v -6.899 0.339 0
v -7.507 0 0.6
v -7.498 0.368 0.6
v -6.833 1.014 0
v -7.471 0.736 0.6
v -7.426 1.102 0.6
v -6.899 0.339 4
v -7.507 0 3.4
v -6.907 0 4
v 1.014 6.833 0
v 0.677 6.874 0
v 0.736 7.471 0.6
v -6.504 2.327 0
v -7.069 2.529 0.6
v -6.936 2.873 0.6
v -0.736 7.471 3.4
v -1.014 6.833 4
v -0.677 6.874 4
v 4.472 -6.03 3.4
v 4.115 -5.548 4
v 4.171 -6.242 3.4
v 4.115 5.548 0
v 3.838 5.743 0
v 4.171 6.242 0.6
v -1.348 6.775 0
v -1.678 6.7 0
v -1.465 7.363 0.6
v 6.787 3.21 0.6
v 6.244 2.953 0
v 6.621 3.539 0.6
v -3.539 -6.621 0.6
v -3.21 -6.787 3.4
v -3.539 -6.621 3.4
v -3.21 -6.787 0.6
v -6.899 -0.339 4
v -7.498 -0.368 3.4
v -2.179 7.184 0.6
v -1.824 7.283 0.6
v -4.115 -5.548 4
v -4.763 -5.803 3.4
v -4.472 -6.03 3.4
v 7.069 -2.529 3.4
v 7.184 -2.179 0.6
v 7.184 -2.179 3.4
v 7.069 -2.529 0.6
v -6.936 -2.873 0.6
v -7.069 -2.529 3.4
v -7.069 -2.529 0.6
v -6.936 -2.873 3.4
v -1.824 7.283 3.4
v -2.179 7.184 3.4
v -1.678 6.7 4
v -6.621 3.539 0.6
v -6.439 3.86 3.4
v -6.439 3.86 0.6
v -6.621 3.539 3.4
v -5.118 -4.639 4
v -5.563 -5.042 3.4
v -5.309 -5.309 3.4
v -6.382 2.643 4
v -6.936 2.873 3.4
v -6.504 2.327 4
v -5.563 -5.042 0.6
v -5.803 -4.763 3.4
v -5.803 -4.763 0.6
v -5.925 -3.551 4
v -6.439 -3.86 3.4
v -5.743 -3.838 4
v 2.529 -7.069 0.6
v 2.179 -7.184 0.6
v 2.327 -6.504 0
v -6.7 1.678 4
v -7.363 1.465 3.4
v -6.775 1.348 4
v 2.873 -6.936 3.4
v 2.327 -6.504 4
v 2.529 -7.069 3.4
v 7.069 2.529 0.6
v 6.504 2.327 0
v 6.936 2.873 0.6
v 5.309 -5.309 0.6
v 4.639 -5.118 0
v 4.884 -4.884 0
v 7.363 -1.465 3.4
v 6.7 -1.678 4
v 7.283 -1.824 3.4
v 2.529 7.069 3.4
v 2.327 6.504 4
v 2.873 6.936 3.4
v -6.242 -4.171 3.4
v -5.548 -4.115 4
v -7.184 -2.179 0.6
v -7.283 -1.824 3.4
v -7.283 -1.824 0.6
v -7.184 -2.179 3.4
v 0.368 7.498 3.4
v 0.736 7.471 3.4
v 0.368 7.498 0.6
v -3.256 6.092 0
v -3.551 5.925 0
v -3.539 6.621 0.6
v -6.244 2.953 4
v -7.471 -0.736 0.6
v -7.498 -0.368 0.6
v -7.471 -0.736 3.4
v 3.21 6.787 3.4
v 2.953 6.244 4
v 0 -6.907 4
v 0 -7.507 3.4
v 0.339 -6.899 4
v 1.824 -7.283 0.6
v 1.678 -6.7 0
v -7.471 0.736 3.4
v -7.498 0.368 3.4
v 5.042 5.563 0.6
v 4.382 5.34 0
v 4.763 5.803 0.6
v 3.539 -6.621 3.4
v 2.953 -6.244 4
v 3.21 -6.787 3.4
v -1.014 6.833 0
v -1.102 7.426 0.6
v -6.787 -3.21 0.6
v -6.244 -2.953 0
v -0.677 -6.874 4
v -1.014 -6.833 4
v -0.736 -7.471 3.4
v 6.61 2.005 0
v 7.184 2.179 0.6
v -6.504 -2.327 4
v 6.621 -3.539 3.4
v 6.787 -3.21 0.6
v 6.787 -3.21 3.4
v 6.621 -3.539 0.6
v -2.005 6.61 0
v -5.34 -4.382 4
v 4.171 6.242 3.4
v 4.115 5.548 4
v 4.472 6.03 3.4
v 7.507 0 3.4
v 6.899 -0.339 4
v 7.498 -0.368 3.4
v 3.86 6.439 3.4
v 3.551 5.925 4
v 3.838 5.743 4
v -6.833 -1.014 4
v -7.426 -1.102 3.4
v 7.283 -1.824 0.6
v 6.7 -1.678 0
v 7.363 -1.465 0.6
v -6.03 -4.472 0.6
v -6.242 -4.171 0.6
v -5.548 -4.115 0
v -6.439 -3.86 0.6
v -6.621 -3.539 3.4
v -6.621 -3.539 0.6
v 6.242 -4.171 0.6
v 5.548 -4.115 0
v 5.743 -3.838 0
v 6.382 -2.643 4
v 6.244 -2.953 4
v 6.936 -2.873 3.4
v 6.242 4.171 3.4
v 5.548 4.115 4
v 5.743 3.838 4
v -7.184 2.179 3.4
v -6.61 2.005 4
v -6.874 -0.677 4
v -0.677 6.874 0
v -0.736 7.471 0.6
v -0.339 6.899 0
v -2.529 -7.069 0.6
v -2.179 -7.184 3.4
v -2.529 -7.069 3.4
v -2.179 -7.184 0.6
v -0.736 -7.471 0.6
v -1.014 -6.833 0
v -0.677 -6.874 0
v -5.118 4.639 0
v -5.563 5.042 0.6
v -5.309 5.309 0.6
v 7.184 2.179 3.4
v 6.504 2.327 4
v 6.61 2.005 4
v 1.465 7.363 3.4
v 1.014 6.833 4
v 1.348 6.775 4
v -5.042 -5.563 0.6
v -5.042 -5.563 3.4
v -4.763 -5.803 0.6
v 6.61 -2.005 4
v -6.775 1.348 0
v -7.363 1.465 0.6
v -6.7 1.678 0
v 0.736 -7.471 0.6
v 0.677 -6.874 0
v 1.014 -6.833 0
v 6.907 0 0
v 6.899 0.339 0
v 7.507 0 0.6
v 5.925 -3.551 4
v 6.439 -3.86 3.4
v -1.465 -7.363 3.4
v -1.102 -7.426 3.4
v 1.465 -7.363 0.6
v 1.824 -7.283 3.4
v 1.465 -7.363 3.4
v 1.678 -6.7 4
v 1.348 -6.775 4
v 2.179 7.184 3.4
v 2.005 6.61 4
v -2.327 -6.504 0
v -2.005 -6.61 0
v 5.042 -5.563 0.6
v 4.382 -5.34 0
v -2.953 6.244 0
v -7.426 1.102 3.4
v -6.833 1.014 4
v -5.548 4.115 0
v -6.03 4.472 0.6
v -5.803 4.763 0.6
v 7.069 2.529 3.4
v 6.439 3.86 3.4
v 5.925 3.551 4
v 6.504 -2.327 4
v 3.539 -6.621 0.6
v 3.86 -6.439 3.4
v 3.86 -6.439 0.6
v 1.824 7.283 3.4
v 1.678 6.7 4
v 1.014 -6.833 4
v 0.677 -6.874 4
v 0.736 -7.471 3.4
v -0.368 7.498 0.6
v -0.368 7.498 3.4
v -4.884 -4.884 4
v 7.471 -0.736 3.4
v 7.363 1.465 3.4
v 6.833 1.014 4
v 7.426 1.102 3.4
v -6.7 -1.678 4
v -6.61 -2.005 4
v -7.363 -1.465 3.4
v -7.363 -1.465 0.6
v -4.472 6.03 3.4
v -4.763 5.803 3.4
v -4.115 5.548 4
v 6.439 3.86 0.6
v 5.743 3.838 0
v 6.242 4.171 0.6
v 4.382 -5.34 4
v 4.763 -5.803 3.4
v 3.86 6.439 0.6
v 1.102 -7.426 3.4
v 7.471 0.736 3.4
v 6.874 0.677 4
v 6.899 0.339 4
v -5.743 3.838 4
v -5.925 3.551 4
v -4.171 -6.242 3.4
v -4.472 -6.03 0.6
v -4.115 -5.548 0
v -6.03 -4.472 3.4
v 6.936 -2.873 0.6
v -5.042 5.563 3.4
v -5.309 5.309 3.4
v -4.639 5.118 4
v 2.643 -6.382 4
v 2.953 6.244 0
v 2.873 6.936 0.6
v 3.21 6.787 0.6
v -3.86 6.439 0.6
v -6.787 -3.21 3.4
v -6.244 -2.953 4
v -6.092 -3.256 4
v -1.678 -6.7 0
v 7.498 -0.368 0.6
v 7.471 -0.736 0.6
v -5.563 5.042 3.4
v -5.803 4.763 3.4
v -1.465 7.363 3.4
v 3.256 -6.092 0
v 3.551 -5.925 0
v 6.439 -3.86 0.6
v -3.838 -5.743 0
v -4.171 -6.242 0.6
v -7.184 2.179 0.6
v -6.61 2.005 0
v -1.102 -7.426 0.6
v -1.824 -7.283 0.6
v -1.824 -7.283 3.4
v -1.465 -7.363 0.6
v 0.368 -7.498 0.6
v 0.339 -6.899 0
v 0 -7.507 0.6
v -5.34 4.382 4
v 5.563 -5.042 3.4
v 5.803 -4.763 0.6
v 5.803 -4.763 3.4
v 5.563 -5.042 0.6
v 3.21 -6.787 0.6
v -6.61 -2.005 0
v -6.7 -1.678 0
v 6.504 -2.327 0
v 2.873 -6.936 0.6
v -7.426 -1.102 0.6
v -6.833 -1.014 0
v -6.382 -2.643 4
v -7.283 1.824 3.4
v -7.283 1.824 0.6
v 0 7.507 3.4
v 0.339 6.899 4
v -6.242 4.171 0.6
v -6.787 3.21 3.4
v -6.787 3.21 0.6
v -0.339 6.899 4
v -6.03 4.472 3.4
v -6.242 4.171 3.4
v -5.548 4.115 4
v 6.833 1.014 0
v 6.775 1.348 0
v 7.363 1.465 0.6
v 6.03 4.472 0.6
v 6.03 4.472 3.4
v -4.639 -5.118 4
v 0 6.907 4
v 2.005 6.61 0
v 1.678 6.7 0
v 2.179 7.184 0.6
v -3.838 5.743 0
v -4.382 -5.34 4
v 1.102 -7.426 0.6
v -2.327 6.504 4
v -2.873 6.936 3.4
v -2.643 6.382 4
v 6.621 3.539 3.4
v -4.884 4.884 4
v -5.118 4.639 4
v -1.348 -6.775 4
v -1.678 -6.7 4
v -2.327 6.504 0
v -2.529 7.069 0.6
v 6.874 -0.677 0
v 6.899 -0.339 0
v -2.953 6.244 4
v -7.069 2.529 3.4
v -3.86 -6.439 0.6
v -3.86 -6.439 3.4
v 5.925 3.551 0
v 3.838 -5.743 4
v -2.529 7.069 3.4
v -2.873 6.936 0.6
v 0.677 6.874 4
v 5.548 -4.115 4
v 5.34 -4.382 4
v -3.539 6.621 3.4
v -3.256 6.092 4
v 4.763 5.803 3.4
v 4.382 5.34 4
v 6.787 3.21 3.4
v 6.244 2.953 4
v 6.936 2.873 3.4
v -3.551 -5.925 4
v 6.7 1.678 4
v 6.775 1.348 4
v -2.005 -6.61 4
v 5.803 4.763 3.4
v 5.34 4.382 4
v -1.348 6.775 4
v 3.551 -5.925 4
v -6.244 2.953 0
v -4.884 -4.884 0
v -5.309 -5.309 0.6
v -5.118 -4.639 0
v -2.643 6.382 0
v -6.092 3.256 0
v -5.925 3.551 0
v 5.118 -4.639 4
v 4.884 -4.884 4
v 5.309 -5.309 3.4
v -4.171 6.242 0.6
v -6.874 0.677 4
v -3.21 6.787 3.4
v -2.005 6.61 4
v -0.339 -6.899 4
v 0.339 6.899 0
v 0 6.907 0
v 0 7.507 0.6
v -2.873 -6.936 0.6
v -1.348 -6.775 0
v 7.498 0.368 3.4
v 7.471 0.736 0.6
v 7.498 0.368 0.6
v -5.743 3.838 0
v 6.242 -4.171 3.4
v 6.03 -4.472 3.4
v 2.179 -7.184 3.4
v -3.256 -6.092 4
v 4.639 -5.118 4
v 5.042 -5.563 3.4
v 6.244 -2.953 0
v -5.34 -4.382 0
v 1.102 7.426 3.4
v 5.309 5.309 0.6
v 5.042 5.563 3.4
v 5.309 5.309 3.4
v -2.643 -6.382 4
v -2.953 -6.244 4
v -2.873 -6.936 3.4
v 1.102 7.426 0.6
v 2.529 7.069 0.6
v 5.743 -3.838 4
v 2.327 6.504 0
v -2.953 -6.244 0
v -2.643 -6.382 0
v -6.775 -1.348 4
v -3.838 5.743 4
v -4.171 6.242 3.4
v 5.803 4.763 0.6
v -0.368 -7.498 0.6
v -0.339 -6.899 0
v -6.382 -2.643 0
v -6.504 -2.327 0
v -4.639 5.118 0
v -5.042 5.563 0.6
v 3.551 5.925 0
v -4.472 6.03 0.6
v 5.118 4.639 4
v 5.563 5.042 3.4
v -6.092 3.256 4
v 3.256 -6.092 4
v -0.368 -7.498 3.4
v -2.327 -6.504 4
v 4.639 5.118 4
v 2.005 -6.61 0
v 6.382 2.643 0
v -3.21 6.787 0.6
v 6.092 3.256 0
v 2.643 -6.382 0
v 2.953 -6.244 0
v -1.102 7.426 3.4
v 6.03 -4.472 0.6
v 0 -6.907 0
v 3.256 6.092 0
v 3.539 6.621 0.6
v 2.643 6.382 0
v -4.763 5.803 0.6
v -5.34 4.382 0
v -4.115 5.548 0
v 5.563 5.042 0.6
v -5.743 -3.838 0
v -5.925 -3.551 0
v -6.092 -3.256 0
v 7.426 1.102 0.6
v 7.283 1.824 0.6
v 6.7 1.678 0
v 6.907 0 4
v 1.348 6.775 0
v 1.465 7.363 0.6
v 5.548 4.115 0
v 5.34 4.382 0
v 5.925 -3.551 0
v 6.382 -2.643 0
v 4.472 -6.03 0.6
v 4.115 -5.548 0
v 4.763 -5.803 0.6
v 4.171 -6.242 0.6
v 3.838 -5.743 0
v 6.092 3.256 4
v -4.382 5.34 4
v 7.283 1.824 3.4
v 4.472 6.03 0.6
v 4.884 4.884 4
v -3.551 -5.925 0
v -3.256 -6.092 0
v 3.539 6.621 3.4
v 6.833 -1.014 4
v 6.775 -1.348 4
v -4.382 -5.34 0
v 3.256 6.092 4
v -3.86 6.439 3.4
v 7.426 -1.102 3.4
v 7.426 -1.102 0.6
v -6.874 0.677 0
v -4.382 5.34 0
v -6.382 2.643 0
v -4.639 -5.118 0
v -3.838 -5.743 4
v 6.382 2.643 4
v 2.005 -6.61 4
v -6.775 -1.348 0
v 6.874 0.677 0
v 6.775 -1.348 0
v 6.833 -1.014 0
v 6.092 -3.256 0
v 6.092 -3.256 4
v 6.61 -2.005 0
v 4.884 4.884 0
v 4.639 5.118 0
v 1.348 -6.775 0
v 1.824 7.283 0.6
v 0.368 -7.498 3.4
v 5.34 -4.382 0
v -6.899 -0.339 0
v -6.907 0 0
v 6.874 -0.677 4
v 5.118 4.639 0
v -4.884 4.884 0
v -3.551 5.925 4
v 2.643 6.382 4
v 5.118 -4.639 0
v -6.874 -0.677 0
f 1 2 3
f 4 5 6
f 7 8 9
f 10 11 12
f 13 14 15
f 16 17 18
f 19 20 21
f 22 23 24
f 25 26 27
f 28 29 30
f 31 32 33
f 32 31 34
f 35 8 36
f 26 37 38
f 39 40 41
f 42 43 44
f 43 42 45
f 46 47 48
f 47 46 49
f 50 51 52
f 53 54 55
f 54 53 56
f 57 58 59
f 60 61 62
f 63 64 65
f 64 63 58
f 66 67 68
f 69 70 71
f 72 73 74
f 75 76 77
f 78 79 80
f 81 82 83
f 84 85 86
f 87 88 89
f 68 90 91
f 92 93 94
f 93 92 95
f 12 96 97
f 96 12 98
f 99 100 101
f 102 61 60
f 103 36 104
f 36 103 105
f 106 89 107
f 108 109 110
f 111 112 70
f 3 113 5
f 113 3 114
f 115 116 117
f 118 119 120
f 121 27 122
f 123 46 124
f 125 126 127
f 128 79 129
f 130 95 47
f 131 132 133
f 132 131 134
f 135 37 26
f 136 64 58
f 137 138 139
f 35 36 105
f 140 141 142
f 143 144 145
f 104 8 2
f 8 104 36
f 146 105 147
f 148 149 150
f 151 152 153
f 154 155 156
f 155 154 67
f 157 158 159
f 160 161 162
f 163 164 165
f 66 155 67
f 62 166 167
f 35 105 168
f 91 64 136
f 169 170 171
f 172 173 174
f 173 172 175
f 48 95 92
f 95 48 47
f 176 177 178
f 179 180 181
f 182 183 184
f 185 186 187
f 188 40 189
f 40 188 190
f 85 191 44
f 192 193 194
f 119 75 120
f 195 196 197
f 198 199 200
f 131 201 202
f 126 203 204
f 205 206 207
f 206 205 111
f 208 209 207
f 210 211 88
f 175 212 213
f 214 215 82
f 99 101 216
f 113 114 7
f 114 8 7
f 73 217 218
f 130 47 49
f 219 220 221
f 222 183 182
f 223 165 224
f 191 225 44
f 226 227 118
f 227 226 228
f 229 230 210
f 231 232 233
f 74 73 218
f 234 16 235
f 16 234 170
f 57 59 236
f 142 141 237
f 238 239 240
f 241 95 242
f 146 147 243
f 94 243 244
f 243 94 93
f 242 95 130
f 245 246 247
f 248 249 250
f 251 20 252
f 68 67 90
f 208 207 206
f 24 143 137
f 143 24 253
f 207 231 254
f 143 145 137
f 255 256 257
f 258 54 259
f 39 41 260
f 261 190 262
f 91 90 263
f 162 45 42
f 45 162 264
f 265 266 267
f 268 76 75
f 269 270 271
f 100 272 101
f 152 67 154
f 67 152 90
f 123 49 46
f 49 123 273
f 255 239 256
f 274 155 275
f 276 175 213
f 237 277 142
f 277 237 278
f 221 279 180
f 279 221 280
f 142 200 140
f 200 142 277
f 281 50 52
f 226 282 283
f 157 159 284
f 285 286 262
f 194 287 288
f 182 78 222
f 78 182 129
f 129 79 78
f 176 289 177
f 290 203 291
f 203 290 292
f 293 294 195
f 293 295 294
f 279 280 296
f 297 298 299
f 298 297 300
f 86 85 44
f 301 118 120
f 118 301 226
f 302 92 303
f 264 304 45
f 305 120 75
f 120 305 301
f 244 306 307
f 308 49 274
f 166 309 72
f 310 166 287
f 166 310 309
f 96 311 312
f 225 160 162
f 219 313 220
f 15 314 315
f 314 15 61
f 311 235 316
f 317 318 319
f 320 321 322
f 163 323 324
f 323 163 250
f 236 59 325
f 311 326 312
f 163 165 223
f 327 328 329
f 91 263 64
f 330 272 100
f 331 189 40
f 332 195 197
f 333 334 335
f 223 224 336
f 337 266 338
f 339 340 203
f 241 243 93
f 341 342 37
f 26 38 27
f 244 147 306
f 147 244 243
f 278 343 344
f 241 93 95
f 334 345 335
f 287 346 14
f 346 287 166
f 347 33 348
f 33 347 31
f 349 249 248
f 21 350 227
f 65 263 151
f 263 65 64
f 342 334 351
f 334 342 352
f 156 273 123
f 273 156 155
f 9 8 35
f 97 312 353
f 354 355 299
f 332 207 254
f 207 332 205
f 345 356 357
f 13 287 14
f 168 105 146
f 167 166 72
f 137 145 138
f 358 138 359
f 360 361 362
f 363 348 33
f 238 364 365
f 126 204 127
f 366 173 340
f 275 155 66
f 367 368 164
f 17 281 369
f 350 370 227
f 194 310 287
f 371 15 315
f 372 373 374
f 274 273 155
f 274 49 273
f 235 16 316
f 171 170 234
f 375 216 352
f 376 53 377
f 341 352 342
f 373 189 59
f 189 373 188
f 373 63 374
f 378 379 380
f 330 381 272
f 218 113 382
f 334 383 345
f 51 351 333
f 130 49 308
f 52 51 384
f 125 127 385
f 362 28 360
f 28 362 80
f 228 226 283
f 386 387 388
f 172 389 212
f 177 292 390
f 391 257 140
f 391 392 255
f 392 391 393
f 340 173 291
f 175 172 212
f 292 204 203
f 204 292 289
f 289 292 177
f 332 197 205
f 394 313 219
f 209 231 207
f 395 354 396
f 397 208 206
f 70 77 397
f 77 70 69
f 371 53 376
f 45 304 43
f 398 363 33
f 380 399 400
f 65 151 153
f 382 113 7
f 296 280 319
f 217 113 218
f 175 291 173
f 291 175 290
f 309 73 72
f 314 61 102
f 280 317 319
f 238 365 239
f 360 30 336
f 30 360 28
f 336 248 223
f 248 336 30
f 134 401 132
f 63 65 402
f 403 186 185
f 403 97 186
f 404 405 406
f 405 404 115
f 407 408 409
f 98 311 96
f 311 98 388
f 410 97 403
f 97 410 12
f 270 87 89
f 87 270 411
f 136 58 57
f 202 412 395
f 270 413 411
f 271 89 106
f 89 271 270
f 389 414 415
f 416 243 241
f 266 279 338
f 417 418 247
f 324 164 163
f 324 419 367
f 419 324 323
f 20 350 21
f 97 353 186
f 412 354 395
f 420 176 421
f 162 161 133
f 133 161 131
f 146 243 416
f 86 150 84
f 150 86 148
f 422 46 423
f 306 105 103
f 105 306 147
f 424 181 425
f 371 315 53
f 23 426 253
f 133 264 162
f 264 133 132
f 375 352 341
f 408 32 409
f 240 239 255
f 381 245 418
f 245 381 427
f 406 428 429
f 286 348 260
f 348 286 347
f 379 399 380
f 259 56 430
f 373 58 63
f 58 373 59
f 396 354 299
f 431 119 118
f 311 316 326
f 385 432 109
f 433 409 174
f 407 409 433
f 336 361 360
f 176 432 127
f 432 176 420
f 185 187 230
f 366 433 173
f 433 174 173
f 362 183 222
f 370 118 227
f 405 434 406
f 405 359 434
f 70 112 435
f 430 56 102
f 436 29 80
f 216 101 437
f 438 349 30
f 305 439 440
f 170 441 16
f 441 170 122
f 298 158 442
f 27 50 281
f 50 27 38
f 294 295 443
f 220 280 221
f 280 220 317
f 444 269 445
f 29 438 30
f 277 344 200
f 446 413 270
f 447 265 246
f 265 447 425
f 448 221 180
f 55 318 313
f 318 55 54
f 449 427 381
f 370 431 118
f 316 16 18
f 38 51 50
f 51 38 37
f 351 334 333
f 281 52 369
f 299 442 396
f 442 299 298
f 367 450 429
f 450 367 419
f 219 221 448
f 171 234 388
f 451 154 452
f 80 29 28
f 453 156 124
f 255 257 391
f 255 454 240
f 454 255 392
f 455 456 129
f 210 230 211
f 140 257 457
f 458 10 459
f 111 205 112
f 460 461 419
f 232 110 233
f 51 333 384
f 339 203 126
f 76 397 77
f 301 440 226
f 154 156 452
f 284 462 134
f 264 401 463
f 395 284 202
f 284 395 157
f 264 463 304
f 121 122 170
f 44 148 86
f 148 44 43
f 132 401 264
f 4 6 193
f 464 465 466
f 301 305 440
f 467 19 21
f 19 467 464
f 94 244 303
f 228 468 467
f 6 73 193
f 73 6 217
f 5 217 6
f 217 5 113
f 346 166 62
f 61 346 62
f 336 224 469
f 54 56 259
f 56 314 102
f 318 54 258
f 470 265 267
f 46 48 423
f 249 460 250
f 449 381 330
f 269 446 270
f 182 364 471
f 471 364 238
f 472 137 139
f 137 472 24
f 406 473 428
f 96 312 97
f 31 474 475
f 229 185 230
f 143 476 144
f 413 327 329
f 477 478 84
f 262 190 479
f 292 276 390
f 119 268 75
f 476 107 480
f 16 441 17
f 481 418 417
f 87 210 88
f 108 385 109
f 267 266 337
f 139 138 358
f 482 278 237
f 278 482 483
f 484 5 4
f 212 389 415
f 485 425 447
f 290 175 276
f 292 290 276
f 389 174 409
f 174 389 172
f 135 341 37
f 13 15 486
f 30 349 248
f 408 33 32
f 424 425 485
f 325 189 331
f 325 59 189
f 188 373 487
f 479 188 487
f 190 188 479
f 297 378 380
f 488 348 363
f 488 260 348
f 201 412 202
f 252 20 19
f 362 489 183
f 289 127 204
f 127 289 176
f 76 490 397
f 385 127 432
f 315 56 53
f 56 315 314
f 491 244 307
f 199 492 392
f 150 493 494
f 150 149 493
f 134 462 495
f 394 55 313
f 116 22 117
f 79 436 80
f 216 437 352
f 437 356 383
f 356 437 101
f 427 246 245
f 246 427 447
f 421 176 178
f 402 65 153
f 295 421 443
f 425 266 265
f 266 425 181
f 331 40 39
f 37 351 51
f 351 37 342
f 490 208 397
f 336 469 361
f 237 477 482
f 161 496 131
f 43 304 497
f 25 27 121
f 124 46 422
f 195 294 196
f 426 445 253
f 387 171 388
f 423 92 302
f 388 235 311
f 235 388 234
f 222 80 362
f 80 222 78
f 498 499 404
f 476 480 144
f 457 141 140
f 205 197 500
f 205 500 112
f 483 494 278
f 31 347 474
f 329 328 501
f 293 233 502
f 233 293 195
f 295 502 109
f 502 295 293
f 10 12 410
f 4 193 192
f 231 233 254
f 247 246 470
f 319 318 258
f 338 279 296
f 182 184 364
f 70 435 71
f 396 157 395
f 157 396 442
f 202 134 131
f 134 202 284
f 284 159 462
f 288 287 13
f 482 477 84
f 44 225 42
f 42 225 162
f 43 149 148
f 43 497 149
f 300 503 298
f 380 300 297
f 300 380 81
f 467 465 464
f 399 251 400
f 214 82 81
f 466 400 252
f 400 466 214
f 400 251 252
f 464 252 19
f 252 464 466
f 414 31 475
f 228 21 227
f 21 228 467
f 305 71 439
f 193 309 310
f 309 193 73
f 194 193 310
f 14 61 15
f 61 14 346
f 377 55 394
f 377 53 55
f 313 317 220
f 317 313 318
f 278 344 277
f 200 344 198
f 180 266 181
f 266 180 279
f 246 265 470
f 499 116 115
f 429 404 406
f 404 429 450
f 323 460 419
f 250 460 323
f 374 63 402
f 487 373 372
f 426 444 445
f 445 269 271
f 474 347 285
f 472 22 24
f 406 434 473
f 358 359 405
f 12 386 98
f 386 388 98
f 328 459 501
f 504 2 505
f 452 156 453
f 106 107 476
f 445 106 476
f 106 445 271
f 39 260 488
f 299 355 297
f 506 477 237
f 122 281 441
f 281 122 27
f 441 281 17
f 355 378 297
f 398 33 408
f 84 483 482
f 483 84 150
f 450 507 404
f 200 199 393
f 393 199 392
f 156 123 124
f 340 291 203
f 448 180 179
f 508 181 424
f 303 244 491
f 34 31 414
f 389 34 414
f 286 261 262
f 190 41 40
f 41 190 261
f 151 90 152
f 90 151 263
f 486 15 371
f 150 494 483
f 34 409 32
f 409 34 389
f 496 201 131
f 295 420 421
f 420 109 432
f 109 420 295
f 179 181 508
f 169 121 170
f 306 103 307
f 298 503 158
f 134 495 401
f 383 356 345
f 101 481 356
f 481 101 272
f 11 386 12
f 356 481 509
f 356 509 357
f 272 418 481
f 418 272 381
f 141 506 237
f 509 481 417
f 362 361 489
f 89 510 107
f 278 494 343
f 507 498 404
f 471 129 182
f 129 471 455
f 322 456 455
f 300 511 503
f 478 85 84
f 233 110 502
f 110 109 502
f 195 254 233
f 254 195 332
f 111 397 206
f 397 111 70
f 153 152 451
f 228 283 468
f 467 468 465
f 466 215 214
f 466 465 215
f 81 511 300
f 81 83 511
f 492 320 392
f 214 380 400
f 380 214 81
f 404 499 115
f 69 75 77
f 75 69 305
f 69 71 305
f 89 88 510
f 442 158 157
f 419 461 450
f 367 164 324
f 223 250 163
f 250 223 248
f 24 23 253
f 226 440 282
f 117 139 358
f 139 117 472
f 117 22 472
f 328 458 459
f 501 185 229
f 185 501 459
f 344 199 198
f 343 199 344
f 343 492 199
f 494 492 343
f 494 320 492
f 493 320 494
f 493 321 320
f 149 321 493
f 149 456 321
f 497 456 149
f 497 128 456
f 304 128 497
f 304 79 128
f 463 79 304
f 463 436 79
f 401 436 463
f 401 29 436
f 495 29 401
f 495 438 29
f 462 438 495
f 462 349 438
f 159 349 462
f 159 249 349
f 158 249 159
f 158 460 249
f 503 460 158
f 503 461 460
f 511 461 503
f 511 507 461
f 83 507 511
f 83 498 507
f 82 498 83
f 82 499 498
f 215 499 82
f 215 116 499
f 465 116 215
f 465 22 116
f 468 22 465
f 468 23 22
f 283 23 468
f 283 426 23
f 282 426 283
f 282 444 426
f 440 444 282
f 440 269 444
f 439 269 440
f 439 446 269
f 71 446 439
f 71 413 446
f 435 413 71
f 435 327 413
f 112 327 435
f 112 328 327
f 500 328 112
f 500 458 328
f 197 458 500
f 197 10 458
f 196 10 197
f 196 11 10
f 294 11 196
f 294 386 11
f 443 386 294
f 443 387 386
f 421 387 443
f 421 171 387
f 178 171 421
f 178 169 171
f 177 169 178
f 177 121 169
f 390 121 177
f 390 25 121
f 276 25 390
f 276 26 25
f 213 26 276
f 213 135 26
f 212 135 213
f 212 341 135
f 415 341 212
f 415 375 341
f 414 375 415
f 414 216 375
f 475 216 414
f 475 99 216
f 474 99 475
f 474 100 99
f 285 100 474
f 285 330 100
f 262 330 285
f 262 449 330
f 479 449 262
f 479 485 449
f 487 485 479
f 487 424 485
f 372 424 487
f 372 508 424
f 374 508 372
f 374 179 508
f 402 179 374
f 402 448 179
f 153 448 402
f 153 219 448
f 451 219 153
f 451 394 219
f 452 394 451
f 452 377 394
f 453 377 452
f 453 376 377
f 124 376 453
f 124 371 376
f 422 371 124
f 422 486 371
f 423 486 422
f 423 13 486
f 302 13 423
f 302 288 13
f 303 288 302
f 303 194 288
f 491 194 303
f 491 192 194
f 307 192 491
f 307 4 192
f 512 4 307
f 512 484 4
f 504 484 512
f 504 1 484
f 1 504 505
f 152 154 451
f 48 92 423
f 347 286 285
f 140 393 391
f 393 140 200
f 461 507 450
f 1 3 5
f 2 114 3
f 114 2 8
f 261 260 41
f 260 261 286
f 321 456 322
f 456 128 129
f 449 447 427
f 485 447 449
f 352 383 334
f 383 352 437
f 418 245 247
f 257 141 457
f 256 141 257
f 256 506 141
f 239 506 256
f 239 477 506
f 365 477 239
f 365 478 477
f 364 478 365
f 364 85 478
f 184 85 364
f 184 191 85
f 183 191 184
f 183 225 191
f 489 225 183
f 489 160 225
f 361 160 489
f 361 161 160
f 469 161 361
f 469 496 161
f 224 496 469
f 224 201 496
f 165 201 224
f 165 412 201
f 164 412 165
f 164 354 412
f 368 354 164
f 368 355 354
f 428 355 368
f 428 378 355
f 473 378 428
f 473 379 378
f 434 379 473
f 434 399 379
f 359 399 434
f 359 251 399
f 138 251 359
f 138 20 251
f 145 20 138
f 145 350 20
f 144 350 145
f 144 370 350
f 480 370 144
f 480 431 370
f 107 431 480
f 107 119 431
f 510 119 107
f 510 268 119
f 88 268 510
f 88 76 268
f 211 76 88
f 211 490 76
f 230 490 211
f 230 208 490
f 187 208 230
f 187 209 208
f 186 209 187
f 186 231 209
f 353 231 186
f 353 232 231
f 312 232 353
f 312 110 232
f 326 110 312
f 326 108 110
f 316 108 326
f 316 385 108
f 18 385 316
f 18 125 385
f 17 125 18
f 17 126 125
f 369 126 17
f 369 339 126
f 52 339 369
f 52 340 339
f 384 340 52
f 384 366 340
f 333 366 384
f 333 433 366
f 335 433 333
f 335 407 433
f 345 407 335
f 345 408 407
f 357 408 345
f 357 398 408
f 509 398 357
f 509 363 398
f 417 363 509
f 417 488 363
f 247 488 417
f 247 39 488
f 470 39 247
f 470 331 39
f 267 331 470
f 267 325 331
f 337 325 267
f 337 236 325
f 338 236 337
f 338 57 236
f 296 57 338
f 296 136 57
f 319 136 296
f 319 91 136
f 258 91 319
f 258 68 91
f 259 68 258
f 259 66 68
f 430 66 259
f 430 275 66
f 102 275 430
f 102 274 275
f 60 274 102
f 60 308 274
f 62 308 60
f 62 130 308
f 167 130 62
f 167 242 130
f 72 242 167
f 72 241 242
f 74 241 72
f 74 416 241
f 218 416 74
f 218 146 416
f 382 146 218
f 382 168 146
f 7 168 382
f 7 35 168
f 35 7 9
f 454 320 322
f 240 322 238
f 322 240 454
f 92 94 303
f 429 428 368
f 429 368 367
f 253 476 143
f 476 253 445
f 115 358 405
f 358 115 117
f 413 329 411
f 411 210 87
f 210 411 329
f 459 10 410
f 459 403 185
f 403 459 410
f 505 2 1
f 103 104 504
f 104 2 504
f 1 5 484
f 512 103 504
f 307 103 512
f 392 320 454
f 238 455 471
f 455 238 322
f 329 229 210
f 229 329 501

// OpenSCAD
// Chess coins: flat two-colour discs for the chess camera project.
//
// Each coin is a disc with the piece symbol inlaid flush into the top, so
// the camera sees a clean, shadow-free mark and the coins stack neatly.
// Designed for multi-material printing (e.g. Prusa Core One + MMU3):
// the body and the inlay are separate parts that fit together exactly.
//
// part = "body"  : the disc with the symbol pocket cut out
// part = "inlay" : the symbol that fills the pocket
// part = "all"   : both together (single-colour print, or for previews)

piece  = "king";      // king, queen, rook, bishop, knight, pawn
part   = "all";
square = 19.5;        // board square size in mm (yours is just under 20)

diameter     = square * 0.77;  // 15 mm on a 19.5 mm square
thickness    = 4;
inlay_depth  = 1.0;            // 5 layers at 0.2 mm
chamfer      = 0.6;

$fn = 128;

module disc() {
    r = diameter / 2;
    rotate_extrude() polygon([[0, 0], [r - chamfer, 0], [r, chamfer],
                              [r, thickness - chamfer], [r - chamfer, thickness],
                              [0, thickness]]);
}

module symbol2d(p) {
    s = diameter * 0.62;
    w = s * 0.2;
    if (p == "king")
        union() { square([s, w], center = true); square([w, s], center = true); }
    if (p == "queen")
        union() {
            circle(d = w * 1.1);
            for (a = [0 : 72 : 359]) rotate(a + 90) translate([s * 0.38, 0]) circle(d = w * 1.1);
        }
    if (p == "rook")
        difference() { square(s * 0.85, center = true); square(s * 0.85 - 2 * w, center = true); }
    if (p == "bishop")
        rotate(45) square([s * 1.05, w], center = true);
    if (p == "knight")
        translate([-s * 0.3, -s * 0.4]) union() { square([w, s * 0.8]); square([s * 0.6, w]); }
    if (p == "pawn")
        circle(d = s * 0.45);
}

module inlay() {
    translate([0, 0, thickness - inlay_depth]) linear_extrude(inlay_depth) symbol2d(piece);
}

if (part == "body" || part == "all") difference() { disc(); inlay(); }
if (part == "inlay" || part == "all") inlay();
